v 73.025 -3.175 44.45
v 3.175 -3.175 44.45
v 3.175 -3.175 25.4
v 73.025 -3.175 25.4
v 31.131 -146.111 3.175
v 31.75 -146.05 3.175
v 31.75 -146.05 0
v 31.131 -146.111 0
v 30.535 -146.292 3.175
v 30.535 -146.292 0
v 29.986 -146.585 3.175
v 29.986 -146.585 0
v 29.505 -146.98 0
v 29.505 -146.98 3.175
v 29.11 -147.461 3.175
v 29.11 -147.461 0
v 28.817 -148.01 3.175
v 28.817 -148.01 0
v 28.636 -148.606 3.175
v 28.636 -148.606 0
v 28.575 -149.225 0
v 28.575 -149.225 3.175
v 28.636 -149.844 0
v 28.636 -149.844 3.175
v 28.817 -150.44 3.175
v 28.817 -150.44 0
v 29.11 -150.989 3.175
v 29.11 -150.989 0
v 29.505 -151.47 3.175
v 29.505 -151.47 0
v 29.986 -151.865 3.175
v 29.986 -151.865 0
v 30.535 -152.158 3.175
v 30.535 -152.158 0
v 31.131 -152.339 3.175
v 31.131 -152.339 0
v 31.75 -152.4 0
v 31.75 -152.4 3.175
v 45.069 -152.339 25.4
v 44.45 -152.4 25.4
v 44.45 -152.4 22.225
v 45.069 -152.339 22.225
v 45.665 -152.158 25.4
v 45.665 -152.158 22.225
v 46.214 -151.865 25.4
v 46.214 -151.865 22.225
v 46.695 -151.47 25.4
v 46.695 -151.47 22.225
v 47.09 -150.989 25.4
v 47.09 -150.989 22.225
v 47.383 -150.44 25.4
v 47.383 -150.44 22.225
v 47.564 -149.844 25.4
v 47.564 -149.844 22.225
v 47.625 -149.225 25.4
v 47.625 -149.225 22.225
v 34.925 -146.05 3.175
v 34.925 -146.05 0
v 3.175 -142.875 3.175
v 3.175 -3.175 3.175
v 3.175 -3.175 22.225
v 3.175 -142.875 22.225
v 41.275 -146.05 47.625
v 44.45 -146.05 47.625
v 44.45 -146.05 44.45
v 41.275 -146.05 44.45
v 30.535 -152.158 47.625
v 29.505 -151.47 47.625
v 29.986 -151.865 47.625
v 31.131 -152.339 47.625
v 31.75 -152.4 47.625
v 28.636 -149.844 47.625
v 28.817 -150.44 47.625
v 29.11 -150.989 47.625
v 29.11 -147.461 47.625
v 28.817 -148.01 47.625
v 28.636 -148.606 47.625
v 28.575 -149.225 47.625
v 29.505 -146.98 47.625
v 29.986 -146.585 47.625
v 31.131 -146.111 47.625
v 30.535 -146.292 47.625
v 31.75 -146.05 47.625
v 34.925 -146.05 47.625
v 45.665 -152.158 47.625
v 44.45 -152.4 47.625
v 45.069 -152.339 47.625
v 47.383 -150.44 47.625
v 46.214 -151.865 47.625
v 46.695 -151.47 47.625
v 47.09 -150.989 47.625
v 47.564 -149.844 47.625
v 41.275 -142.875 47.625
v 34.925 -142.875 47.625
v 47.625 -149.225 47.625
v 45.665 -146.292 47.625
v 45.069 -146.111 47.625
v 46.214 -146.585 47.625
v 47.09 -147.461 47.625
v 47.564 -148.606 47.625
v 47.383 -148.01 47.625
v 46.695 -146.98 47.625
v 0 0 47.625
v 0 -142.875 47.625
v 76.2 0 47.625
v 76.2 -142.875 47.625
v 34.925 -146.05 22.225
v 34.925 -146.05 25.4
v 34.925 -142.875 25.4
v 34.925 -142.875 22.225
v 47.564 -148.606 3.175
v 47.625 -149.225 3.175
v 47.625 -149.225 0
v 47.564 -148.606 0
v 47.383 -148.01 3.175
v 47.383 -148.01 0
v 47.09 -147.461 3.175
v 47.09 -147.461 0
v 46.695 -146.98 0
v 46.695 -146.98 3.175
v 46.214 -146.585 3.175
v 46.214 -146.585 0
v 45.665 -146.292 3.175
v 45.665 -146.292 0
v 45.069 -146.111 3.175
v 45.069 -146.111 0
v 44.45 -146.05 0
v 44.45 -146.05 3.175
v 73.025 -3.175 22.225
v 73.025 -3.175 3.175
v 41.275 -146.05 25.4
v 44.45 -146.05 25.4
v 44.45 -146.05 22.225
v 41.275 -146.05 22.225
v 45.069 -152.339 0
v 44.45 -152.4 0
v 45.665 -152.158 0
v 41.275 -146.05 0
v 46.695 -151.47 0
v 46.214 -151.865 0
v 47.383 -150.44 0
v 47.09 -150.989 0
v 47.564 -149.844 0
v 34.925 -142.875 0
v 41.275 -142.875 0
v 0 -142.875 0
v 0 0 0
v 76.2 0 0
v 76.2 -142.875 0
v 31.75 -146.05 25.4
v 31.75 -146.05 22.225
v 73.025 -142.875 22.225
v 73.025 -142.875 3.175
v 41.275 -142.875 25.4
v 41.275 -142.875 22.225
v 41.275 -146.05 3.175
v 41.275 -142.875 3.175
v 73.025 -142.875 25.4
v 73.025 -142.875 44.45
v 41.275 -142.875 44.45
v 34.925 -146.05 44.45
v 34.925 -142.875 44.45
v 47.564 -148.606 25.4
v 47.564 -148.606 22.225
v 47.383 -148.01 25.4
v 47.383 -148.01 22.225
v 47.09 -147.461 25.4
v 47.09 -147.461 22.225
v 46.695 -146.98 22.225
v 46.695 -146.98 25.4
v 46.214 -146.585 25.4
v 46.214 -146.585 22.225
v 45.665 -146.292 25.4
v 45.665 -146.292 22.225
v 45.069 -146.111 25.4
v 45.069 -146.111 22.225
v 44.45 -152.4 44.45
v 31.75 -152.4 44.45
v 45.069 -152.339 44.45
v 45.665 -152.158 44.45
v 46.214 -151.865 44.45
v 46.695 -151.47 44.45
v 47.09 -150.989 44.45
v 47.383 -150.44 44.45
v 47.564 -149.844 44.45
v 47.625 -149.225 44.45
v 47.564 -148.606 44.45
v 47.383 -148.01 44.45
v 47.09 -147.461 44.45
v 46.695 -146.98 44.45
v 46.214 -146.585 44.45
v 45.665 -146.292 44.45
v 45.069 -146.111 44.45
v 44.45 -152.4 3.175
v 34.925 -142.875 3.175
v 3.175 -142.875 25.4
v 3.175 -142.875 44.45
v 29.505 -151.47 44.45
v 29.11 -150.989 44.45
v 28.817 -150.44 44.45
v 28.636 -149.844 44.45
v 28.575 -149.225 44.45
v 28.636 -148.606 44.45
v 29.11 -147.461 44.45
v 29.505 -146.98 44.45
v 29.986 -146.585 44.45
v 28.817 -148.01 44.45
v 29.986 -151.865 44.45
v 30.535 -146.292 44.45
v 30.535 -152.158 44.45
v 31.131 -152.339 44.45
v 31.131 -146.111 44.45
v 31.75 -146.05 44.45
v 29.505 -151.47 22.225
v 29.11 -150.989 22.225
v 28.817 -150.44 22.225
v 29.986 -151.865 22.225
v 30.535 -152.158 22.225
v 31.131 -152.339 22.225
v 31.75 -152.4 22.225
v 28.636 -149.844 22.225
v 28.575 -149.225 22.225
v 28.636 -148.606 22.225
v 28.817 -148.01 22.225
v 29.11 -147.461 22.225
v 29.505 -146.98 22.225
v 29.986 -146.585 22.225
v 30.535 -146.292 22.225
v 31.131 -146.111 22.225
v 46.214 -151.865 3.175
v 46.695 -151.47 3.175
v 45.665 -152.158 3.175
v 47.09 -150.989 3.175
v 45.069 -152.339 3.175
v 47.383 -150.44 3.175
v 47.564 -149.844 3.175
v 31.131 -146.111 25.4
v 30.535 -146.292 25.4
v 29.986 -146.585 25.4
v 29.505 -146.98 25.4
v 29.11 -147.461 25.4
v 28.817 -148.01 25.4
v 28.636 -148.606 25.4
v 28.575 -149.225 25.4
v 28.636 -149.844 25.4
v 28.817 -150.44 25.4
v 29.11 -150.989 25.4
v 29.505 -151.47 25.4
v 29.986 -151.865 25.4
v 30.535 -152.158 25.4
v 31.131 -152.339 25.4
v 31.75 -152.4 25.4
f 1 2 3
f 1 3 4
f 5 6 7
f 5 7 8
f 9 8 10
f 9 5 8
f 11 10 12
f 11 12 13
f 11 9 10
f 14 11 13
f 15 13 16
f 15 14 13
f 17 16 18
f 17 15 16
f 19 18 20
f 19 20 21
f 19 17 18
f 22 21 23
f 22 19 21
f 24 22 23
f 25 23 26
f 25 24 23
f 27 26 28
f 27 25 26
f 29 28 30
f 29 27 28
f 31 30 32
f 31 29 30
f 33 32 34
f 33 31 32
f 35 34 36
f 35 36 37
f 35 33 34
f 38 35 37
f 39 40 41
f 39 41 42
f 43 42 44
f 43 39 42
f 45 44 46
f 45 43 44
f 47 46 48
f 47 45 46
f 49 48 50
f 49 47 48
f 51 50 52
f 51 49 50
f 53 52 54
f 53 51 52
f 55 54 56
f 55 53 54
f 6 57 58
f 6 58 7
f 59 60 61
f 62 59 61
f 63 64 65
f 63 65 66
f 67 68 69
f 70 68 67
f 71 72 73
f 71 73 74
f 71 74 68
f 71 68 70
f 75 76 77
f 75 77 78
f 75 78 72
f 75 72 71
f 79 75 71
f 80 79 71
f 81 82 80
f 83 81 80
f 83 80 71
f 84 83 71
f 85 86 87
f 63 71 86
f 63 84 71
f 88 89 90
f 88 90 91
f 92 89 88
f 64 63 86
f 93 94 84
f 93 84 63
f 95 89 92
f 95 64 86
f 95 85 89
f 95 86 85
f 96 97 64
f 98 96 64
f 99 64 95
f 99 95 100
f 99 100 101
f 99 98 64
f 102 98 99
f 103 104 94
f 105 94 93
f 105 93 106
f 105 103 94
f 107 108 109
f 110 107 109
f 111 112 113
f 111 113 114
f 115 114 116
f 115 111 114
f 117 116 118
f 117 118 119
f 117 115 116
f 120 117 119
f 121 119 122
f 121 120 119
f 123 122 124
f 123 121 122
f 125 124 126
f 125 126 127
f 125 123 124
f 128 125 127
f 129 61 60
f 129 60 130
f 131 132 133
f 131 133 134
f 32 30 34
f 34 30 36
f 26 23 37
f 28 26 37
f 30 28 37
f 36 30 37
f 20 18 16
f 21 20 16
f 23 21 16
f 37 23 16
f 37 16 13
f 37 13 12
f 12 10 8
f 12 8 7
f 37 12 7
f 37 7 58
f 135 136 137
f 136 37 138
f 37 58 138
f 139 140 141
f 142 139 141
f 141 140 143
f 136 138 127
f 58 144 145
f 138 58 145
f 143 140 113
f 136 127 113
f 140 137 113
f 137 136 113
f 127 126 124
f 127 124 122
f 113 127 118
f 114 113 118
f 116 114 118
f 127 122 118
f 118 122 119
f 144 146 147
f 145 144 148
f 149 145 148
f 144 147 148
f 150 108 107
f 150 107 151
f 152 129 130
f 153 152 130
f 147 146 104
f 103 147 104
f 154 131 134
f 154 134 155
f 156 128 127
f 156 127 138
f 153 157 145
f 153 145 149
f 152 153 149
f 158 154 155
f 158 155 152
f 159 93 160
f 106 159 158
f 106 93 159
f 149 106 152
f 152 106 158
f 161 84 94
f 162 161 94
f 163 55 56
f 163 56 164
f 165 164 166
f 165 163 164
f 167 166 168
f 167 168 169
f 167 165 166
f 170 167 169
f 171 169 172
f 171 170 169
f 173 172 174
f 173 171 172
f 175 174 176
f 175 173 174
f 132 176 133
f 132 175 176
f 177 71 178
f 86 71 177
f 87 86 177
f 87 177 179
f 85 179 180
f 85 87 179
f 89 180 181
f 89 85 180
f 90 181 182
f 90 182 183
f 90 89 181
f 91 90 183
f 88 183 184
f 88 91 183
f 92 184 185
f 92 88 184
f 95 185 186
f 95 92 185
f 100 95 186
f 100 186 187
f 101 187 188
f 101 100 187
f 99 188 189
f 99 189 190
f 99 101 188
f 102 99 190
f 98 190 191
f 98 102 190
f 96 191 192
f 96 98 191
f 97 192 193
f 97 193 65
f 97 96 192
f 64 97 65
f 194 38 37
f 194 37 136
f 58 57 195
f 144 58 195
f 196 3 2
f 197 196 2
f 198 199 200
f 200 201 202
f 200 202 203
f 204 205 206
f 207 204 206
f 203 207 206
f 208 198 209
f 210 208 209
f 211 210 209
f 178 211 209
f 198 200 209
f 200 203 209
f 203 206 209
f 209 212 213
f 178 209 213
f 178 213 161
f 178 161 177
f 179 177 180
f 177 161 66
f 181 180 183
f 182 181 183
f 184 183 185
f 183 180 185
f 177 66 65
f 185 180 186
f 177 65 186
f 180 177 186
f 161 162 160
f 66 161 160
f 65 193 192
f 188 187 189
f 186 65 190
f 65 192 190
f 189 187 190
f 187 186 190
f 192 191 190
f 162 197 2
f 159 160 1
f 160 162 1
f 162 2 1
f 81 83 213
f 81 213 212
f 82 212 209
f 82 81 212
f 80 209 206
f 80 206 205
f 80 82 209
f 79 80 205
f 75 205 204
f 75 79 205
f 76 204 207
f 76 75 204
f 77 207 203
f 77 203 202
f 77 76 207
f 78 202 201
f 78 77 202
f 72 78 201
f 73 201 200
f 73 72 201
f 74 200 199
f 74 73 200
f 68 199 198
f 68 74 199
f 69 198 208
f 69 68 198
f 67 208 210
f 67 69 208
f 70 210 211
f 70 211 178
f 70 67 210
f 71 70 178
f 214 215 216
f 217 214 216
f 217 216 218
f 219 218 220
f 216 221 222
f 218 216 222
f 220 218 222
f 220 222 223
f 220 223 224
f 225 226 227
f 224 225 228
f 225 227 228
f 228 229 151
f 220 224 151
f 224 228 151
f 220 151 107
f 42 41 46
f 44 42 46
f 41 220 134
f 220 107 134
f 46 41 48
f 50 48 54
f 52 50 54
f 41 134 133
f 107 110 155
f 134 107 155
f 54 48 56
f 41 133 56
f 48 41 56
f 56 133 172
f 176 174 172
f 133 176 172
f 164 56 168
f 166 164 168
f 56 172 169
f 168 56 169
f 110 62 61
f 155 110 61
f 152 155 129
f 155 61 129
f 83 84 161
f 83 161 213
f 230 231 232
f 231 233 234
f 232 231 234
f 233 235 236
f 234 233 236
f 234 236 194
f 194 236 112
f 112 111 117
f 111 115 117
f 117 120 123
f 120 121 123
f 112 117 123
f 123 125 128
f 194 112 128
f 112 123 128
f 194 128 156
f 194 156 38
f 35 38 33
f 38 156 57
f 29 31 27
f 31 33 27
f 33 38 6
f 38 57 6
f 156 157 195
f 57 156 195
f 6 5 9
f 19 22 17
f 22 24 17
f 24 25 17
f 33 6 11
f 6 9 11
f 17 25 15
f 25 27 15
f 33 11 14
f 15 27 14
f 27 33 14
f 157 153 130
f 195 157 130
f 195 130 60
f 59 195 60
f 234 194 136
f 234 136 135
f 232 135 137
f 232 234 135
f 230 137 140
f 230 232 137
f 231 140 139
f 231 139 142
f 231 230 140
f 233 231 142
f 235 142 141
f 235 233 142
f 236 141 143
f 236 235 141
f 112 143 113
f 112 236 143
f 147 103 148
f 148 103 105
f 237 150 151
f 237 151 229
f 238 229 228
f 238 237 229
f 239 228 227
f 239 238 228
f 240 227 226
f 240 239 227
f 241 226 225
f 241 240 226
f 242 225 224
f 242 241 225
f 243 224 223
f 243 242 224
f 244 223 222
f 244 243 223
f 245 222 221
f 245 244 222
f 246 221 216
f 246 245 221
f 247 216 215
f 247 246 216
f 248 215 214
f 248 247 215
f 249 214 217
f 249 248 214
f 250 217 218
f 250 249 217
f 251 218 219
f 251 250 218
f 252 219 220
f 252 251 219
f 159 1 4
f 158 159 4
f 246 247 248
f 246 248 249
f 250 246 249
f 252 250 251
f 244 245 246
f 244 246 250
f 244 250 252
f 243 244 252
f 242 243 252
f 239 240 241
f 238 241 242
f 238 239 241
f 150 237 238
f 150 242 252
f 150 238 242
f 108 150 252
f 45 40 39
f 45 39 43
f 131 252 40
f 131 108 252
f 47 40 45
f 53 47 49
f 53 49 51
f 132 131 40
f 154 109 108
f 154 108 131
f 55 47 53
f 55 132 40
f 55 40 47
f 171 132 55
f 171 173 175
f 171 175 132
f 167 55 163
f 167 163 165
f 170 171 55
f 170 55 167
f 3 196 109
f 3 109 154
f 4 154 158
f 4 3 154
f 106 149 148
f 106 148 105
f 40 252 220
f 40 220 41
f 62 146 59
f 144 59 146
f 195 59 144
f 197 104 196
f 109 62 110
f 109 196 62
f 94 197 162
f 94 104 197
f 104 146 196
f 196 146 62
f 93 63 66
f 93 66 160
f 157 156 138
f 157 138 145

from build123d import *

# Parameters (mm, degrees)
F0_W     = 76.2
F0_H     = 47.625
F1_DEPTH = 3.175
F2_W     = 76.2
F2_H     = 47.625
F2_W_2   = 69.85
F2_H_2   = 1.5875
F3_DEPTH = 139.7
F4_W     = 3.175
F4_H     = 3.175
F5_DEPTH = 47.625
F6_DEPTH = 2540


with BuildPart() as f1:
    # F0 (on Front) → F1 (new body)
    with BuildSketch(Plane.XZ):
        with Locations((38.1, 23.8125)):
            Rectangle(F0_W, F0_H)
    extrude(amount=F1_DEPTH)

    # F2 (on face) → F3 (join)
    with BuildSketch(Plane.XZ.offset(3.175)):
        with Locations((38.1, 23.8125)):
            Rectangle(F2_W, F2_H)
        Polygon((73.025, 3.175), (3.175, 3.175), (3.175, 22.225), (3.175, 23.8125), (3.175, 25.4), (3.175, 32.016575672), (3.175, 44.45), (73.025, 44.45), (73.025, 32.016575672), (73.025, 25.4), (73.025, 23.8125), (73.025, 22.225), align=None, mode=Mode.SUBTRACT)
        with Locations((38.1, 23.01875)):
            Rectangle(F2_W_2, F2_H_2)
        with Locations((38.1, 24.60625)):
            Rectangle(F2_W_2, F2_H_2)
    extrude(amount=F3_DEPTH)

    # F4 (on face) → F5 (join, through all)
    with BuildSketch(Plane.XY.offset(47.625)):
        with BuildLine():
            Line((41.275, -149.225), (38.1, -149.225))
            Line((38.1, -149.225), (34.925, -149.225))
            ThreePointArc((34.925, -149.225), (33.9950640303, -151.4700640303), (31.75, -152.4))
            Line((31.75, -152.4), (44.45, -152.4))
            ThreePointArc((44.45, -152.4), (42.2049359697, -151.4700640303), (41.275, -149.225))
        make_face()
        with BuildLine():
            ThreePointArc((31.75, -152.4), (33.9950640303, -151.4700640303), (34.925, -149.225))
            Line((34.925, -149.225), (31.75, -149.225))
            Line((31.75, -149.225), (31.75, -152.4))
        make_face()
        with BuildLine():
            Line((31.75, -149.225), (34.925, -149.225))
            ThreePointArc((34.925, -149.225), (33.9950640303, -146.9799359697), (31.75, -146.05))
            ThreePointArc((31.75, -146.05), (28.575, -149.225), (31.75, -152.4))
            Line((31.75, -152.4), (31.75, -149.225))
        make_face()
        with BuildLine():
            Line((38.1, -149.225), (38.1, -146.05))
            Line((38.1, -146.05), (34.925, -146.05))
            Line((34.925, -146.05), (31.75, -146.05))
            ThreePointArc((31.75, -146.05), (33.9950640303, -146.9799359697), (34.925, -149.225))
            Line((34.925, -149.225), (38.1, -149.225))
        make_face()
        with BuildLine():
            Line((41.275, -146.05), (38.1, -146.05))
            Line((38.1, -146.05), (38.1, -149.225))
            Line((38.1, -149.225), (41.275, -149.225))
            ThreePointArc((41.275, -149.225), (42.2049359697, -146.9799359697), (44.45, -146.05))
            Line((44.45, -146.05), (41.275, -146.05))
        make_face()
        with BuildLine():
            ThreePointArc((47.625, -149.225), (46.6950640303, -146.9799359697), (44.45, -146.05))
            Line((44.45, -146.05), (44.45, -149.225))
            Line((44.45, -149.225), (44.45, -152.4))
            ThreePointArc((44.45, -152.4), (46.6950640303, -151.4700640303), (47.625, -149.225))
        make_face()
        with BuildLine():
            ThreePointArc((44.45, -146.05), (42.2049359697, -146.9799359697), (41.275, -149.225))
            Line((41.275, -149.225), (44.45, -149.225))
            Line((44.45, -149.225), (44.45, -146.05))
        make_face()
        with BuildLine():
            Line((44.45, -149.225), (41.275, -149.225))
            ThreePointArc((41.275, -149.225), (42.2049359697, -151.4700640303), (44.45, -152.4))
            Line((44.45, -152.4), (44.45, -149.225))
        make_face()
        with Locations((39.6875, -144.4625)):
            Rectangle(F4_W, F4_H)
        with Locations((36.5125, -144.4625)):
            Rectangle(F4_W, F4_H)
    extrude(amount=-F5_DEPTH)

    # F6 (cut): faces of the model
    f6_faces = [f1.faces().sort_by_distance(p)[0] for p in [
        (38.1, -3.175, 12.7),
        (38.1, -3.175, 34.925),
    ]]
    extrude(f6_faces, amount=F6_DEPTH, mode=Mode.SUBTRACT)


solid = f1.part
